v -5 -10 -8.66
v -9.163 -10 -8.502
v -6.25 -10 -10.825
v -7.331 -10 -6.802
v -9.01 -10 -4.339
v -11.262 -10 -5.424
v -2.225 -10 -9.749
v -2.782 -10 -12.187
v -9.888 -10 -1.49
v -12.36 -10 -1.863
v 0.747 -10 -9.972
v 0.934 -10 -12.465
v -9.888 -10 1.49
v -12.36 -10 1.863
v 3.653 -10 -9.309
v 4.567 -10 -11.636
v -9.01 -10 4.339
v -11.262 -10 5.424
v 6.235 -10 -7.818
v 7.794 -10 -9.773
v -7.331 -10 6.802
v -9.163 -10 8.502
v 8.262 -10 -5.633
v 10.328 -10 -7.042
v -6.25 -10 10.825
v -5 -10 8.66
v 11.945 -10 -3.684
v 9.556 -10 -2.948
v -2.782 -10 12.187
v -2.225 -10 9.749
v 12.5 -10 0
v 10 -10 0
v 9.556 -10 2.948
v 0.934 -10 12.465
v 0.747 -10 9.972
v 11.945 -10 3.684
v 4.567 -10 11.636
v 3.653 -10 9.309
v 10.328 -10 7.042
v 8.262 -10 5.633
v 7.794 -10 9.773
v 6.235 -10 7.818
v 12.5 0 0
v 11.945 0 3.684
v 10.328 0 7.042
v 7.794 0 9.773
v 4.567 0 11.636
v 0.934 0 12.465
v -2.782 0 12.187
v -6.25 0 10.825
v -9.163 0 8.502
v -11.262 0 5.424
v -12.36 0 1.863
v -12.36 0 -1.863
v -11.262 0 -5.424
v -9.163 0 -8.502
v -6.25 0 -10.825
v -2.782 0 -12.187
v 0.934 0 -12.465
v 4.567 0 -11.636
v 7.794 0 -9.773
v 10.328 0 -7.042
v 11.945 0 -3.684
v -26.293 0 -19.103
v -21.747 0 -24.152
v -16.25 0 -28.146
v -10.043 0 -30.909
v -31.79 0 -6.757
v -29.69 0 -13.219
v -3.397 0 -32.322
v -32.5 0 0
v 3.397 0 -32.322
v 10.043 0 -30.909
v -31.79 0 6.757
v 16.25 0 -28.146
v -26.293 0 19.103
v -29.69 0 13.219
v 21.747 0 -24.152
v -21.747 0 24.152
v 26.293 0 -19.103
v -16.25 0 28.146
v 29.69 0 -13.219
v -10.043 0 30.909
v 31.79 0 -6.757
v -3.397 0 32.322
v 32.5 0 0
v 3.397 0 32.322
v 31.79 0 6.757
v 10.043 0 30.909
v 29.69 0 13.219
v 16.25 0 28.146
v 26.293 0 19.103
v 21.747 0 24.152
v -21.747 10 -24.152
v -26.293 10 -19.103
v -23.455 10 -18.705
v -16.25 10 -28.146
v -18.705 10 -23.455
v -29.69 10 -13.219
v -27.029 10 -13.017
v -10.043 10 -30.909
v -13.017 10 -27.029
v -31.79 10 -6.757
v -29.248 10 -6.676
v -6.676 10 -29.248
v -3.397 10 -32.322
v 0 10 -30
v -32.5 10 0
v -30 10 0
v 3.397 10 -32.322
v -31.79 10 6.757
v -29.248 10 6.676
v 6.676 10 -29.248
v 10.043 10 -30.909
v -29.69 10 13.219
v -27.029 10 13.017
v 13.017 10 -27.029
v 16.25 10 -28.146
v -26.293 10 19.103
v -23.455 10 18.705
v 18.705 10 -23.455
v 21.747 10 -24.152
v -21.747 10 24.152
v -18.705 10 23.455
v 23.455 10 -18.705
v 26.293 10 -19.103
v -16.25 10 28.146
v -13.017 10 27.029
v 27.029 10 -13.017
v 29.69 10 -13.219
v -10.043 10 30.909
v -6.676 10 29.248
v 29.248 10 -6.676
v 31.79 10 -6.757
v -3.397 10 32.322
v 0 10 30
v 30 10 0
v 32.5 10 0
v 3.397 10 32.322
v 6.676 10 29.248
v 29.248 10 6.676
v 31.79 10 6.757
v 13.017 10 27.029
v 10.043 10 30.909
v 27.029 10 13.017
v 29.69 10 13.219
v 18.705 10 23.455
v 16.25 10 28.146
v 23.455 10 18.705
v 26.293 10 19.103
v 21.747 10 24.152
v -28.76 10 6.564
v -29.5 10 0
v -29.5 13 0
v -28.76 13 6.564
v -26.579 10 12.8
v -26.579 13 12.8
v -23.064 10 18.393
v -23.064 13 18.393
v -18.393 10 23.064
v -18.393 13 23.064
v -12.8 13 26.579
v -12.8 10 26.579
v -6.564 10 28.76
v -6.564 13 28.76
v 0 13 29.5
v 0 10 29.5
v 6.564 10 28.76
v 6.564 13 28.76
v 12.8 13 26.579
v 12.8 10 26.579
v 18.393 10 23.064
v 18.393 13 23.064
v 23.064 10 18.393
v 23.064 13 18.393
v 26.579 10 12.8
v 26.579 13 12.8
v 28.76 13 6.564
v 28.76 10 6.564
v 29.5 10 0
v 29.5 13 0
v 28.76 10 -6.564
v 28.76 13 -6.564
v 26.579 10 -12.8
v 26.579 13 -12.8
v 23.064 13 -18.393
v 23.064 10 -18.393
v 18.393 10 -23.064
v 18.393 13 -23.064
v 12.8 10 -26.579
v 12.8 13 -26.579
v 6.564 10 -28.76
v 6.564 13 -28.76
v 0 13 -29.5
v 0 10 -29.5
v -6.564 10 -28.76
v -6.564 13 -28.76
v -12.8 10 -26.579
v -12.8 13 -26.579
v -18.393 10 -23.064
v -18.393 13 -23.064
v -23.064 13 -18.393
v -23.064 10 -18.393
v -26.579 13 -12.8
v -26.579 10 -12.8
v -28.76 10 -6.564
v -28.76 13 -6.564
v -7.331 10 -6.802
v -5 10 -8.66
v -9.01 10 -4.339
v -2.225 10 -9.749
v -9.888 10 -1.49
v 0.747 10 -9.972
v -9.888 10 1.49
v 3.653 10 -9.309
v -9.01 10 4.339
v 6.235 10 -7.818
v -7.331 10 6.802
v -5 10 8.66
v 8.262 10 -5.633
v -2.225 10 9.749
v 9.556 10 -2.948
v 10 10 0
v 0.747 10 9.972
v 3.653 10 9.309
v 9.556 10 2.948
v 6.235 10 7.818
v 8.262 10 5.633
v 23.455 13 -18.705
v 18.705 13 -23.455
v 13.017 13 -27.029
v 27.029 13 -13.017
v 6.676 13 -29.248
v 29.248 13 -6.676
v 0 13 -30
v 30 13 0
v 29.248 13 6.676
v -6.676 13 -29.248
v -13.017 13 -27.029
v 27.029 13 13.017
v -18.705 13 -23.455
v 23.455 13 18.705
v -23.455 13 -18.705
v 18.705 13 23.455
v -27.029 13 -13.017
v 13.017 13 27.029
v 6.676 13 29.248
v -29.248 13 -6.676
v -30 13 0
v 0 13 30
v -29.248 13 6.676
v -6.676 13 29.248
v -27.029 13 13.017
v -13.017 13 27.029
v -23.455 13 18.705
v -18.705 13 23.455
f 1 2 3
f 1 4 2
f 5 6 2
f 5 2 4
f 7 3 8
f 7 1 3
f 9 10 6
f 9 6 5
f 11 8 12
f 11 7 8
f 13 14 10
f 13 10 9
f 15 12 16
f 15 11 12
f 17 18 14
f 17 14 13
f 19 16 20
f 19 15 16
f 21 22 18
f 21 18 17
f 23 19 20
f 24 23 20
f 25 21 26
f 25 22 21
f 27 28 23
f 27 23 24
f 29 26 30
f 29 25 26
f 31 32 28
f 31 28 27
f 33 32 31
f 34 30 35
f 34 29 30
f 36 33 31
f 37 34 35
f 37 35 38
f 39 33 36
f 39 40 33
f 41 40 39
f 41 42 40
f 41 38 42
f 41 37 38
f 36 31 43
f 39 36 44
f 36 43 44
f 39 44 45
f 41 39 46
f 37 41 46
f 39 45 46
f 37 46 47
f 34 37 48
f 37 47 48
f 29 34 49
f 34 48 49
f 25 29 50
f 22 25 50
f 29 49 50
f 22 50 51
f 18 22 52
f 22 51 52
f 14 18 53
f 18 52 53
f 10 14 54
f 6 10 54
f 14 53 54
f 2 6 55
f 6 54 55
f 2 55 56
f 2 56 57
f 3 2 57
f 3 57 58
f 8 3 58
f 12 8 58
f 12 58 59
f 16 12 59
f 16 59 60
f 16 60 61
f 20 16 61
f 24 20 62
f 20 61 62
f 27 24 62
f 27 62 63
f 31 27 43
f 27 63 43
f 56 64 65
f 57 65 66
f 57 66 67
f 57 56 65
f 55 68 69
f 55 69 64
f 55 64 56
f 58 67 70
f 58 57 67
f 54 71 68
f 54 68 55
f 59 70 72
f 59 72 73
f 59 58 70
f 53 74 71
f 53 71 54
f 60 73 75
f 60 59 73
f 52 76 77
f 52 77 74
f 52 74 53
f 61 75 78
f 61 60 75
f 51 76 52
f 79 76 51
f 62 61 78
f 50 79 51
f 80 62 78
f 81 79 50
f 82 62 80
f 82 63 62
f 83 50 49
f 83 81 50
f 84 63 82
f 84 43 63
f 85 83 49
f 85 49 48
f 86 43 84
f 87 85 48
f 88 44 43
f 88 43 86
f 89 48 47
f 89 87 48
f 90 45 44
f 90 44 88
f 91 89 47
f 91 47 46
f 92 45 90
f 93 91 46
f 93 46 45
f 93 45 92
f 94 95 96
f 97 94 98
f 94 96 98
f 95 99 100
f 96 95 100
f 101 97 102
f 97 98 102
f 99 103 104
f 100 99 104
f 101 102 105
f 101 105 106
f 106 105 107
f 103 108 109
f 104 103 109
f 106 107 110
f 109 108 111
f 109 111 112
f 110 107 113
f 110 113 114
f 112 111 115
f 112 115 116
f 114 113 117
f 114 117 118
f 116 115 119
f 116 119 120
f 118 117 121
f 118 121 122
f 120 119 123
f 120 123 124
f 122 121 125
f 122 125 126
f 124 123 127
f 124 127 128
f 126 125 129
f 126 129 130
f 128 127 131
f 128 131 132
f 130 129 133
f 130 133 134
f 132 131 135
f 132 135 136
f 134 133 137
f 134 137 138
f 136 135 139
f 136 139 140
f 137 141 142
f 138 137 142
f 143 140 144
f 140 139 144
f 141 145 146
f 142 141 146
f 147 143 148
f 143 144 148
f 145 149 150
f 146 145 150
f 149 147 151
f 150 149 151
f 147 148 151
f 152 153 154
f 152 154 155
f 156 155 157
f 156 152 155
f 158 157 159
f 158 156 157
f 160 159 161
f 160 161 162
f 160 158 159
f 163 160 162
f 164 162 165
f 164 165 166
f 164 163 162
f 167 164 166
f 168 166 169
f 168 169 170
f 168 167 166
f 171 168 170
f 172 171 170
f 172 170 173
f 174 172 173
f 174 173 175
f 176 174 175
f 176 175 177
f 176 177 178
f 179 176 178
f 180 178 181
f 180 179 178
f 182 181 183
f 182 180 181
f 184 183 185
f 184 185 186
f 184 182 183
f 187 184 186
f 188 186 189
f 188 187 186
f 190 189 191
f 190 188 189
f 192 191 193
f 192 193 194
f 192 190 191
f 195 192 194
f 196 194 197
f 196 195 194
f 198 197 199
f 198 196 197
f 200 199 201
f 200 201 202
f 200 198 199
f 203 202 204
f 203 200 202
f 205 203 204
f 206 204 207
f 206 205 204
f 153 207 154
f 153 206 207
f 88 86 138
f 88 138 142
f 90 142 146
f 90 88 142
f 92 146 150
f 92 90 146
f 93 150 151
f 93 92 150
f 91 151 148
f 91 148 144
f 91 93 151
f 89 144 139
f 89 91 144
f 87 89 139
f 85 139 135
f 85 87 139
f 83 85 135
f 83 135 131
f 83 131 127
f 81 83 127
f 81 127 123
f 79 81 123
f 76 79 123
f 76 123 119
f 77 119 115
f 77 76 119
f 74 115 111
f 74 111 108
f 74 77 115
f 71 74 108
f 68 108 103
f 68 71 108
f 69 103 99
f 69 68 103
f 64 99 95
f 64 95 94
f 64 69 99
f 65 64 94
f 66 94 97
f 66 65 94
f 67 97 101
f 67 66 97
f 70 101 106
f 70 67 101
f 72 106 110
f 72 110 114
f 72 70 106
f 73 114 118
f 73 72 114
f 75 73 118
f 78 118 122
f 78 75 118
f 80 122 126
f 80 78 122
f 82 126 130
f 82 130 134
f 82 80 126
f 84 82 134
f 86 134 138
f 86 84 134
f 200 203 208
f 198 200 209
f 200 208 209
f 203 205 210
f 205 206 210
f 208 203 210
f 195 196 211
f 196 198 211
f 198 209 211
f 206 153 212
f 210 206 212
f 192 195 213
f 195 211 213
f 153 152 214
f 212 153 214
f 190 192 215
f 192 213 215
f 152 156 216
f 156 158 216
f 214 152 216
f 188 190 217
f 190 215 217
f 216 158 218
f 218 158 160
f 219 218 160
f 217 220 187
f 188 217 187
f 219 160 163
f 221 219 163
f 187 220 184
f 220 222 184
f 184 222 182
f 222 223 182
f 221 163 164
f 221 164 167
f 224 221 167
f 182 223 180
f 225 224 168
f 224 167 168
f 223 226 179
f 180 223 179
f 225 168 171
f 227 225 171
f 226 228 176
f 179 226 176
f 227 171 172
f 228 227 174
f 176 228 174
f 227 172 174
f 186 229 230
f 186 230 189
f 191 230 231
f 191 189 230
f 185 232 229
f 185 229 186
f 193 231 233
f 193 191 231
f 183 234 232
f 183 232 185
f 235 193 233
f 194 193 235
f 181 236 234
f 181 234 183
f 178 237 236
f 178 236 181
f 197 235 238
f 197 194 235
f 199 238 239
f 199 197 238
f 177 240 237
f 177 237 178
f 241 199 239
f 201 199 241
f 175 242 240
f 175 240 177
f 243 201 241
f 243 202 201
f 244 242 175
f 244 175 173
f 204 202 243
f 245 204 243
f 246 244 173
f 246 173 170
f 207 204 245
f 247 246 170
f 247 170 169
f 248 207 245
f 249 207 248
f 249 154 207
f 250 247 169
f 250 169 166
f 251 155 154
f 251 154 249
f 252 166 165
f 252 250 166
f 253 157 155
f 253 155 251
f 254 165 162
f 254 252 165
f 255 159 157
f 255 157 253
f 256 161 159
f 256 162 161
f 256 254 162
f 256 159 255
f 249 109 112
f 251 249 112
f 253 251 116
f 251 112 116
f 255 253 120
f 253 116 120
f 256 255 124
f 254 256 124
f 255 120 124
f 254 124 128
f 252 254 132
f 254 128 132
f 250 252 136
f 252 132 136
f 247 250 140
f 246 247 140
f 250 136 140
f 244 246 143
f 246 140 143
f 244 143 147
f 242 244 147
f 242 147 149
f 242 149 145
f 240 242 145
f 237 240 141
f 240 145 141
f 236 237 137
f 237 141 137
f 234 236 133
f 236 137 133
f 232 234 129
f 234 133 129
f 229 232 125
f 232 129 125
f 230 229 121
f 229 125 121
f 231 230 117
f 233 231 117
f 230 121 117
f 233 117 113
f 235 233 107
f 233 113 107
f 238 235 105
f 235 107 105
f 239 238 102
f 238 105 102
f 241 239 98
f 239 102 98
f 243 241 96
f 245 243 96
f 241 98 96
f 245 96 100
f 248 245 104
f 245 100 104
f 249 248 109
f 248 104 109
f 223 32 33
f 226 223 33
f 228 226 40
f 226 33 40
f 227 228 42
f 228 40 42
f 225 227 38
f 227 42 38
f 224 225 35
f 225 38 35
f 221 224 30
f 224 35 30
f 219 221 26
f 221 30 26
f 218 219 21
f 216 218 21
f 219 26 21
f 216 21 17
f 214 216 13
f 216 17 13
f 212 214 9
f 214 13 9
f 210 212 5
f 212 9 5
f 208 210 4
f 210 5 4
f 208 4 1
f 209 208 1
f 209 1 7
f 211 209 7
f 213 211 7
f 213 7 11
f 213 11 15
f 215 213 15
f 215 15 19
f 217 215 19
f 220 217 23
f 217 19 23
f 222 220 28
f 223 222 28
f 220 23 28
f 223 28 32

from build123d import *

# Parameters (mm, degrees)
F0_R     = 32.5
F1_DEPTH = 10
F2_R     = 12.5
F3_DEPTH = 10
F4_R     = 10
F5_DEPTH = 20
F6_R     = 30
F6_R_2   = 29.5
F7_DEPTH = 3


with BuildPart() as f1:
    # F0 (on Front) → F1 (new body)
    with BuildSketch(Plane.XZ):
        Circle(F0_R)
    extrude(amount=-F1_DEPTH)

    # F2 (on face) → F3 (join)
    with BuildSketch(Plane.XZ):
        Circle(F2_R)
    extrude(amount=F3_DEPTH)

    # F4 (on face) → F5 (cut)
    with BuildSketch(Plane.XZ.offset(10)):
        Circle(F4_R)
    extrude(amount=-F5_DEPTH, mode=Mode.SUBTRACT)

    # F6 (on face) → F7 (join)
    with BuildSketch(Plane(origin=(0, 10, 0), x_dir=(-1, 0, 0), z_dir=(0, 1, 0))):
        Circle(F6_R)
        Circle(F6_R_2, mode=Mode.SUBTRACT)
    extrude(amount=F7_DEPTH)


solid = f1.part
